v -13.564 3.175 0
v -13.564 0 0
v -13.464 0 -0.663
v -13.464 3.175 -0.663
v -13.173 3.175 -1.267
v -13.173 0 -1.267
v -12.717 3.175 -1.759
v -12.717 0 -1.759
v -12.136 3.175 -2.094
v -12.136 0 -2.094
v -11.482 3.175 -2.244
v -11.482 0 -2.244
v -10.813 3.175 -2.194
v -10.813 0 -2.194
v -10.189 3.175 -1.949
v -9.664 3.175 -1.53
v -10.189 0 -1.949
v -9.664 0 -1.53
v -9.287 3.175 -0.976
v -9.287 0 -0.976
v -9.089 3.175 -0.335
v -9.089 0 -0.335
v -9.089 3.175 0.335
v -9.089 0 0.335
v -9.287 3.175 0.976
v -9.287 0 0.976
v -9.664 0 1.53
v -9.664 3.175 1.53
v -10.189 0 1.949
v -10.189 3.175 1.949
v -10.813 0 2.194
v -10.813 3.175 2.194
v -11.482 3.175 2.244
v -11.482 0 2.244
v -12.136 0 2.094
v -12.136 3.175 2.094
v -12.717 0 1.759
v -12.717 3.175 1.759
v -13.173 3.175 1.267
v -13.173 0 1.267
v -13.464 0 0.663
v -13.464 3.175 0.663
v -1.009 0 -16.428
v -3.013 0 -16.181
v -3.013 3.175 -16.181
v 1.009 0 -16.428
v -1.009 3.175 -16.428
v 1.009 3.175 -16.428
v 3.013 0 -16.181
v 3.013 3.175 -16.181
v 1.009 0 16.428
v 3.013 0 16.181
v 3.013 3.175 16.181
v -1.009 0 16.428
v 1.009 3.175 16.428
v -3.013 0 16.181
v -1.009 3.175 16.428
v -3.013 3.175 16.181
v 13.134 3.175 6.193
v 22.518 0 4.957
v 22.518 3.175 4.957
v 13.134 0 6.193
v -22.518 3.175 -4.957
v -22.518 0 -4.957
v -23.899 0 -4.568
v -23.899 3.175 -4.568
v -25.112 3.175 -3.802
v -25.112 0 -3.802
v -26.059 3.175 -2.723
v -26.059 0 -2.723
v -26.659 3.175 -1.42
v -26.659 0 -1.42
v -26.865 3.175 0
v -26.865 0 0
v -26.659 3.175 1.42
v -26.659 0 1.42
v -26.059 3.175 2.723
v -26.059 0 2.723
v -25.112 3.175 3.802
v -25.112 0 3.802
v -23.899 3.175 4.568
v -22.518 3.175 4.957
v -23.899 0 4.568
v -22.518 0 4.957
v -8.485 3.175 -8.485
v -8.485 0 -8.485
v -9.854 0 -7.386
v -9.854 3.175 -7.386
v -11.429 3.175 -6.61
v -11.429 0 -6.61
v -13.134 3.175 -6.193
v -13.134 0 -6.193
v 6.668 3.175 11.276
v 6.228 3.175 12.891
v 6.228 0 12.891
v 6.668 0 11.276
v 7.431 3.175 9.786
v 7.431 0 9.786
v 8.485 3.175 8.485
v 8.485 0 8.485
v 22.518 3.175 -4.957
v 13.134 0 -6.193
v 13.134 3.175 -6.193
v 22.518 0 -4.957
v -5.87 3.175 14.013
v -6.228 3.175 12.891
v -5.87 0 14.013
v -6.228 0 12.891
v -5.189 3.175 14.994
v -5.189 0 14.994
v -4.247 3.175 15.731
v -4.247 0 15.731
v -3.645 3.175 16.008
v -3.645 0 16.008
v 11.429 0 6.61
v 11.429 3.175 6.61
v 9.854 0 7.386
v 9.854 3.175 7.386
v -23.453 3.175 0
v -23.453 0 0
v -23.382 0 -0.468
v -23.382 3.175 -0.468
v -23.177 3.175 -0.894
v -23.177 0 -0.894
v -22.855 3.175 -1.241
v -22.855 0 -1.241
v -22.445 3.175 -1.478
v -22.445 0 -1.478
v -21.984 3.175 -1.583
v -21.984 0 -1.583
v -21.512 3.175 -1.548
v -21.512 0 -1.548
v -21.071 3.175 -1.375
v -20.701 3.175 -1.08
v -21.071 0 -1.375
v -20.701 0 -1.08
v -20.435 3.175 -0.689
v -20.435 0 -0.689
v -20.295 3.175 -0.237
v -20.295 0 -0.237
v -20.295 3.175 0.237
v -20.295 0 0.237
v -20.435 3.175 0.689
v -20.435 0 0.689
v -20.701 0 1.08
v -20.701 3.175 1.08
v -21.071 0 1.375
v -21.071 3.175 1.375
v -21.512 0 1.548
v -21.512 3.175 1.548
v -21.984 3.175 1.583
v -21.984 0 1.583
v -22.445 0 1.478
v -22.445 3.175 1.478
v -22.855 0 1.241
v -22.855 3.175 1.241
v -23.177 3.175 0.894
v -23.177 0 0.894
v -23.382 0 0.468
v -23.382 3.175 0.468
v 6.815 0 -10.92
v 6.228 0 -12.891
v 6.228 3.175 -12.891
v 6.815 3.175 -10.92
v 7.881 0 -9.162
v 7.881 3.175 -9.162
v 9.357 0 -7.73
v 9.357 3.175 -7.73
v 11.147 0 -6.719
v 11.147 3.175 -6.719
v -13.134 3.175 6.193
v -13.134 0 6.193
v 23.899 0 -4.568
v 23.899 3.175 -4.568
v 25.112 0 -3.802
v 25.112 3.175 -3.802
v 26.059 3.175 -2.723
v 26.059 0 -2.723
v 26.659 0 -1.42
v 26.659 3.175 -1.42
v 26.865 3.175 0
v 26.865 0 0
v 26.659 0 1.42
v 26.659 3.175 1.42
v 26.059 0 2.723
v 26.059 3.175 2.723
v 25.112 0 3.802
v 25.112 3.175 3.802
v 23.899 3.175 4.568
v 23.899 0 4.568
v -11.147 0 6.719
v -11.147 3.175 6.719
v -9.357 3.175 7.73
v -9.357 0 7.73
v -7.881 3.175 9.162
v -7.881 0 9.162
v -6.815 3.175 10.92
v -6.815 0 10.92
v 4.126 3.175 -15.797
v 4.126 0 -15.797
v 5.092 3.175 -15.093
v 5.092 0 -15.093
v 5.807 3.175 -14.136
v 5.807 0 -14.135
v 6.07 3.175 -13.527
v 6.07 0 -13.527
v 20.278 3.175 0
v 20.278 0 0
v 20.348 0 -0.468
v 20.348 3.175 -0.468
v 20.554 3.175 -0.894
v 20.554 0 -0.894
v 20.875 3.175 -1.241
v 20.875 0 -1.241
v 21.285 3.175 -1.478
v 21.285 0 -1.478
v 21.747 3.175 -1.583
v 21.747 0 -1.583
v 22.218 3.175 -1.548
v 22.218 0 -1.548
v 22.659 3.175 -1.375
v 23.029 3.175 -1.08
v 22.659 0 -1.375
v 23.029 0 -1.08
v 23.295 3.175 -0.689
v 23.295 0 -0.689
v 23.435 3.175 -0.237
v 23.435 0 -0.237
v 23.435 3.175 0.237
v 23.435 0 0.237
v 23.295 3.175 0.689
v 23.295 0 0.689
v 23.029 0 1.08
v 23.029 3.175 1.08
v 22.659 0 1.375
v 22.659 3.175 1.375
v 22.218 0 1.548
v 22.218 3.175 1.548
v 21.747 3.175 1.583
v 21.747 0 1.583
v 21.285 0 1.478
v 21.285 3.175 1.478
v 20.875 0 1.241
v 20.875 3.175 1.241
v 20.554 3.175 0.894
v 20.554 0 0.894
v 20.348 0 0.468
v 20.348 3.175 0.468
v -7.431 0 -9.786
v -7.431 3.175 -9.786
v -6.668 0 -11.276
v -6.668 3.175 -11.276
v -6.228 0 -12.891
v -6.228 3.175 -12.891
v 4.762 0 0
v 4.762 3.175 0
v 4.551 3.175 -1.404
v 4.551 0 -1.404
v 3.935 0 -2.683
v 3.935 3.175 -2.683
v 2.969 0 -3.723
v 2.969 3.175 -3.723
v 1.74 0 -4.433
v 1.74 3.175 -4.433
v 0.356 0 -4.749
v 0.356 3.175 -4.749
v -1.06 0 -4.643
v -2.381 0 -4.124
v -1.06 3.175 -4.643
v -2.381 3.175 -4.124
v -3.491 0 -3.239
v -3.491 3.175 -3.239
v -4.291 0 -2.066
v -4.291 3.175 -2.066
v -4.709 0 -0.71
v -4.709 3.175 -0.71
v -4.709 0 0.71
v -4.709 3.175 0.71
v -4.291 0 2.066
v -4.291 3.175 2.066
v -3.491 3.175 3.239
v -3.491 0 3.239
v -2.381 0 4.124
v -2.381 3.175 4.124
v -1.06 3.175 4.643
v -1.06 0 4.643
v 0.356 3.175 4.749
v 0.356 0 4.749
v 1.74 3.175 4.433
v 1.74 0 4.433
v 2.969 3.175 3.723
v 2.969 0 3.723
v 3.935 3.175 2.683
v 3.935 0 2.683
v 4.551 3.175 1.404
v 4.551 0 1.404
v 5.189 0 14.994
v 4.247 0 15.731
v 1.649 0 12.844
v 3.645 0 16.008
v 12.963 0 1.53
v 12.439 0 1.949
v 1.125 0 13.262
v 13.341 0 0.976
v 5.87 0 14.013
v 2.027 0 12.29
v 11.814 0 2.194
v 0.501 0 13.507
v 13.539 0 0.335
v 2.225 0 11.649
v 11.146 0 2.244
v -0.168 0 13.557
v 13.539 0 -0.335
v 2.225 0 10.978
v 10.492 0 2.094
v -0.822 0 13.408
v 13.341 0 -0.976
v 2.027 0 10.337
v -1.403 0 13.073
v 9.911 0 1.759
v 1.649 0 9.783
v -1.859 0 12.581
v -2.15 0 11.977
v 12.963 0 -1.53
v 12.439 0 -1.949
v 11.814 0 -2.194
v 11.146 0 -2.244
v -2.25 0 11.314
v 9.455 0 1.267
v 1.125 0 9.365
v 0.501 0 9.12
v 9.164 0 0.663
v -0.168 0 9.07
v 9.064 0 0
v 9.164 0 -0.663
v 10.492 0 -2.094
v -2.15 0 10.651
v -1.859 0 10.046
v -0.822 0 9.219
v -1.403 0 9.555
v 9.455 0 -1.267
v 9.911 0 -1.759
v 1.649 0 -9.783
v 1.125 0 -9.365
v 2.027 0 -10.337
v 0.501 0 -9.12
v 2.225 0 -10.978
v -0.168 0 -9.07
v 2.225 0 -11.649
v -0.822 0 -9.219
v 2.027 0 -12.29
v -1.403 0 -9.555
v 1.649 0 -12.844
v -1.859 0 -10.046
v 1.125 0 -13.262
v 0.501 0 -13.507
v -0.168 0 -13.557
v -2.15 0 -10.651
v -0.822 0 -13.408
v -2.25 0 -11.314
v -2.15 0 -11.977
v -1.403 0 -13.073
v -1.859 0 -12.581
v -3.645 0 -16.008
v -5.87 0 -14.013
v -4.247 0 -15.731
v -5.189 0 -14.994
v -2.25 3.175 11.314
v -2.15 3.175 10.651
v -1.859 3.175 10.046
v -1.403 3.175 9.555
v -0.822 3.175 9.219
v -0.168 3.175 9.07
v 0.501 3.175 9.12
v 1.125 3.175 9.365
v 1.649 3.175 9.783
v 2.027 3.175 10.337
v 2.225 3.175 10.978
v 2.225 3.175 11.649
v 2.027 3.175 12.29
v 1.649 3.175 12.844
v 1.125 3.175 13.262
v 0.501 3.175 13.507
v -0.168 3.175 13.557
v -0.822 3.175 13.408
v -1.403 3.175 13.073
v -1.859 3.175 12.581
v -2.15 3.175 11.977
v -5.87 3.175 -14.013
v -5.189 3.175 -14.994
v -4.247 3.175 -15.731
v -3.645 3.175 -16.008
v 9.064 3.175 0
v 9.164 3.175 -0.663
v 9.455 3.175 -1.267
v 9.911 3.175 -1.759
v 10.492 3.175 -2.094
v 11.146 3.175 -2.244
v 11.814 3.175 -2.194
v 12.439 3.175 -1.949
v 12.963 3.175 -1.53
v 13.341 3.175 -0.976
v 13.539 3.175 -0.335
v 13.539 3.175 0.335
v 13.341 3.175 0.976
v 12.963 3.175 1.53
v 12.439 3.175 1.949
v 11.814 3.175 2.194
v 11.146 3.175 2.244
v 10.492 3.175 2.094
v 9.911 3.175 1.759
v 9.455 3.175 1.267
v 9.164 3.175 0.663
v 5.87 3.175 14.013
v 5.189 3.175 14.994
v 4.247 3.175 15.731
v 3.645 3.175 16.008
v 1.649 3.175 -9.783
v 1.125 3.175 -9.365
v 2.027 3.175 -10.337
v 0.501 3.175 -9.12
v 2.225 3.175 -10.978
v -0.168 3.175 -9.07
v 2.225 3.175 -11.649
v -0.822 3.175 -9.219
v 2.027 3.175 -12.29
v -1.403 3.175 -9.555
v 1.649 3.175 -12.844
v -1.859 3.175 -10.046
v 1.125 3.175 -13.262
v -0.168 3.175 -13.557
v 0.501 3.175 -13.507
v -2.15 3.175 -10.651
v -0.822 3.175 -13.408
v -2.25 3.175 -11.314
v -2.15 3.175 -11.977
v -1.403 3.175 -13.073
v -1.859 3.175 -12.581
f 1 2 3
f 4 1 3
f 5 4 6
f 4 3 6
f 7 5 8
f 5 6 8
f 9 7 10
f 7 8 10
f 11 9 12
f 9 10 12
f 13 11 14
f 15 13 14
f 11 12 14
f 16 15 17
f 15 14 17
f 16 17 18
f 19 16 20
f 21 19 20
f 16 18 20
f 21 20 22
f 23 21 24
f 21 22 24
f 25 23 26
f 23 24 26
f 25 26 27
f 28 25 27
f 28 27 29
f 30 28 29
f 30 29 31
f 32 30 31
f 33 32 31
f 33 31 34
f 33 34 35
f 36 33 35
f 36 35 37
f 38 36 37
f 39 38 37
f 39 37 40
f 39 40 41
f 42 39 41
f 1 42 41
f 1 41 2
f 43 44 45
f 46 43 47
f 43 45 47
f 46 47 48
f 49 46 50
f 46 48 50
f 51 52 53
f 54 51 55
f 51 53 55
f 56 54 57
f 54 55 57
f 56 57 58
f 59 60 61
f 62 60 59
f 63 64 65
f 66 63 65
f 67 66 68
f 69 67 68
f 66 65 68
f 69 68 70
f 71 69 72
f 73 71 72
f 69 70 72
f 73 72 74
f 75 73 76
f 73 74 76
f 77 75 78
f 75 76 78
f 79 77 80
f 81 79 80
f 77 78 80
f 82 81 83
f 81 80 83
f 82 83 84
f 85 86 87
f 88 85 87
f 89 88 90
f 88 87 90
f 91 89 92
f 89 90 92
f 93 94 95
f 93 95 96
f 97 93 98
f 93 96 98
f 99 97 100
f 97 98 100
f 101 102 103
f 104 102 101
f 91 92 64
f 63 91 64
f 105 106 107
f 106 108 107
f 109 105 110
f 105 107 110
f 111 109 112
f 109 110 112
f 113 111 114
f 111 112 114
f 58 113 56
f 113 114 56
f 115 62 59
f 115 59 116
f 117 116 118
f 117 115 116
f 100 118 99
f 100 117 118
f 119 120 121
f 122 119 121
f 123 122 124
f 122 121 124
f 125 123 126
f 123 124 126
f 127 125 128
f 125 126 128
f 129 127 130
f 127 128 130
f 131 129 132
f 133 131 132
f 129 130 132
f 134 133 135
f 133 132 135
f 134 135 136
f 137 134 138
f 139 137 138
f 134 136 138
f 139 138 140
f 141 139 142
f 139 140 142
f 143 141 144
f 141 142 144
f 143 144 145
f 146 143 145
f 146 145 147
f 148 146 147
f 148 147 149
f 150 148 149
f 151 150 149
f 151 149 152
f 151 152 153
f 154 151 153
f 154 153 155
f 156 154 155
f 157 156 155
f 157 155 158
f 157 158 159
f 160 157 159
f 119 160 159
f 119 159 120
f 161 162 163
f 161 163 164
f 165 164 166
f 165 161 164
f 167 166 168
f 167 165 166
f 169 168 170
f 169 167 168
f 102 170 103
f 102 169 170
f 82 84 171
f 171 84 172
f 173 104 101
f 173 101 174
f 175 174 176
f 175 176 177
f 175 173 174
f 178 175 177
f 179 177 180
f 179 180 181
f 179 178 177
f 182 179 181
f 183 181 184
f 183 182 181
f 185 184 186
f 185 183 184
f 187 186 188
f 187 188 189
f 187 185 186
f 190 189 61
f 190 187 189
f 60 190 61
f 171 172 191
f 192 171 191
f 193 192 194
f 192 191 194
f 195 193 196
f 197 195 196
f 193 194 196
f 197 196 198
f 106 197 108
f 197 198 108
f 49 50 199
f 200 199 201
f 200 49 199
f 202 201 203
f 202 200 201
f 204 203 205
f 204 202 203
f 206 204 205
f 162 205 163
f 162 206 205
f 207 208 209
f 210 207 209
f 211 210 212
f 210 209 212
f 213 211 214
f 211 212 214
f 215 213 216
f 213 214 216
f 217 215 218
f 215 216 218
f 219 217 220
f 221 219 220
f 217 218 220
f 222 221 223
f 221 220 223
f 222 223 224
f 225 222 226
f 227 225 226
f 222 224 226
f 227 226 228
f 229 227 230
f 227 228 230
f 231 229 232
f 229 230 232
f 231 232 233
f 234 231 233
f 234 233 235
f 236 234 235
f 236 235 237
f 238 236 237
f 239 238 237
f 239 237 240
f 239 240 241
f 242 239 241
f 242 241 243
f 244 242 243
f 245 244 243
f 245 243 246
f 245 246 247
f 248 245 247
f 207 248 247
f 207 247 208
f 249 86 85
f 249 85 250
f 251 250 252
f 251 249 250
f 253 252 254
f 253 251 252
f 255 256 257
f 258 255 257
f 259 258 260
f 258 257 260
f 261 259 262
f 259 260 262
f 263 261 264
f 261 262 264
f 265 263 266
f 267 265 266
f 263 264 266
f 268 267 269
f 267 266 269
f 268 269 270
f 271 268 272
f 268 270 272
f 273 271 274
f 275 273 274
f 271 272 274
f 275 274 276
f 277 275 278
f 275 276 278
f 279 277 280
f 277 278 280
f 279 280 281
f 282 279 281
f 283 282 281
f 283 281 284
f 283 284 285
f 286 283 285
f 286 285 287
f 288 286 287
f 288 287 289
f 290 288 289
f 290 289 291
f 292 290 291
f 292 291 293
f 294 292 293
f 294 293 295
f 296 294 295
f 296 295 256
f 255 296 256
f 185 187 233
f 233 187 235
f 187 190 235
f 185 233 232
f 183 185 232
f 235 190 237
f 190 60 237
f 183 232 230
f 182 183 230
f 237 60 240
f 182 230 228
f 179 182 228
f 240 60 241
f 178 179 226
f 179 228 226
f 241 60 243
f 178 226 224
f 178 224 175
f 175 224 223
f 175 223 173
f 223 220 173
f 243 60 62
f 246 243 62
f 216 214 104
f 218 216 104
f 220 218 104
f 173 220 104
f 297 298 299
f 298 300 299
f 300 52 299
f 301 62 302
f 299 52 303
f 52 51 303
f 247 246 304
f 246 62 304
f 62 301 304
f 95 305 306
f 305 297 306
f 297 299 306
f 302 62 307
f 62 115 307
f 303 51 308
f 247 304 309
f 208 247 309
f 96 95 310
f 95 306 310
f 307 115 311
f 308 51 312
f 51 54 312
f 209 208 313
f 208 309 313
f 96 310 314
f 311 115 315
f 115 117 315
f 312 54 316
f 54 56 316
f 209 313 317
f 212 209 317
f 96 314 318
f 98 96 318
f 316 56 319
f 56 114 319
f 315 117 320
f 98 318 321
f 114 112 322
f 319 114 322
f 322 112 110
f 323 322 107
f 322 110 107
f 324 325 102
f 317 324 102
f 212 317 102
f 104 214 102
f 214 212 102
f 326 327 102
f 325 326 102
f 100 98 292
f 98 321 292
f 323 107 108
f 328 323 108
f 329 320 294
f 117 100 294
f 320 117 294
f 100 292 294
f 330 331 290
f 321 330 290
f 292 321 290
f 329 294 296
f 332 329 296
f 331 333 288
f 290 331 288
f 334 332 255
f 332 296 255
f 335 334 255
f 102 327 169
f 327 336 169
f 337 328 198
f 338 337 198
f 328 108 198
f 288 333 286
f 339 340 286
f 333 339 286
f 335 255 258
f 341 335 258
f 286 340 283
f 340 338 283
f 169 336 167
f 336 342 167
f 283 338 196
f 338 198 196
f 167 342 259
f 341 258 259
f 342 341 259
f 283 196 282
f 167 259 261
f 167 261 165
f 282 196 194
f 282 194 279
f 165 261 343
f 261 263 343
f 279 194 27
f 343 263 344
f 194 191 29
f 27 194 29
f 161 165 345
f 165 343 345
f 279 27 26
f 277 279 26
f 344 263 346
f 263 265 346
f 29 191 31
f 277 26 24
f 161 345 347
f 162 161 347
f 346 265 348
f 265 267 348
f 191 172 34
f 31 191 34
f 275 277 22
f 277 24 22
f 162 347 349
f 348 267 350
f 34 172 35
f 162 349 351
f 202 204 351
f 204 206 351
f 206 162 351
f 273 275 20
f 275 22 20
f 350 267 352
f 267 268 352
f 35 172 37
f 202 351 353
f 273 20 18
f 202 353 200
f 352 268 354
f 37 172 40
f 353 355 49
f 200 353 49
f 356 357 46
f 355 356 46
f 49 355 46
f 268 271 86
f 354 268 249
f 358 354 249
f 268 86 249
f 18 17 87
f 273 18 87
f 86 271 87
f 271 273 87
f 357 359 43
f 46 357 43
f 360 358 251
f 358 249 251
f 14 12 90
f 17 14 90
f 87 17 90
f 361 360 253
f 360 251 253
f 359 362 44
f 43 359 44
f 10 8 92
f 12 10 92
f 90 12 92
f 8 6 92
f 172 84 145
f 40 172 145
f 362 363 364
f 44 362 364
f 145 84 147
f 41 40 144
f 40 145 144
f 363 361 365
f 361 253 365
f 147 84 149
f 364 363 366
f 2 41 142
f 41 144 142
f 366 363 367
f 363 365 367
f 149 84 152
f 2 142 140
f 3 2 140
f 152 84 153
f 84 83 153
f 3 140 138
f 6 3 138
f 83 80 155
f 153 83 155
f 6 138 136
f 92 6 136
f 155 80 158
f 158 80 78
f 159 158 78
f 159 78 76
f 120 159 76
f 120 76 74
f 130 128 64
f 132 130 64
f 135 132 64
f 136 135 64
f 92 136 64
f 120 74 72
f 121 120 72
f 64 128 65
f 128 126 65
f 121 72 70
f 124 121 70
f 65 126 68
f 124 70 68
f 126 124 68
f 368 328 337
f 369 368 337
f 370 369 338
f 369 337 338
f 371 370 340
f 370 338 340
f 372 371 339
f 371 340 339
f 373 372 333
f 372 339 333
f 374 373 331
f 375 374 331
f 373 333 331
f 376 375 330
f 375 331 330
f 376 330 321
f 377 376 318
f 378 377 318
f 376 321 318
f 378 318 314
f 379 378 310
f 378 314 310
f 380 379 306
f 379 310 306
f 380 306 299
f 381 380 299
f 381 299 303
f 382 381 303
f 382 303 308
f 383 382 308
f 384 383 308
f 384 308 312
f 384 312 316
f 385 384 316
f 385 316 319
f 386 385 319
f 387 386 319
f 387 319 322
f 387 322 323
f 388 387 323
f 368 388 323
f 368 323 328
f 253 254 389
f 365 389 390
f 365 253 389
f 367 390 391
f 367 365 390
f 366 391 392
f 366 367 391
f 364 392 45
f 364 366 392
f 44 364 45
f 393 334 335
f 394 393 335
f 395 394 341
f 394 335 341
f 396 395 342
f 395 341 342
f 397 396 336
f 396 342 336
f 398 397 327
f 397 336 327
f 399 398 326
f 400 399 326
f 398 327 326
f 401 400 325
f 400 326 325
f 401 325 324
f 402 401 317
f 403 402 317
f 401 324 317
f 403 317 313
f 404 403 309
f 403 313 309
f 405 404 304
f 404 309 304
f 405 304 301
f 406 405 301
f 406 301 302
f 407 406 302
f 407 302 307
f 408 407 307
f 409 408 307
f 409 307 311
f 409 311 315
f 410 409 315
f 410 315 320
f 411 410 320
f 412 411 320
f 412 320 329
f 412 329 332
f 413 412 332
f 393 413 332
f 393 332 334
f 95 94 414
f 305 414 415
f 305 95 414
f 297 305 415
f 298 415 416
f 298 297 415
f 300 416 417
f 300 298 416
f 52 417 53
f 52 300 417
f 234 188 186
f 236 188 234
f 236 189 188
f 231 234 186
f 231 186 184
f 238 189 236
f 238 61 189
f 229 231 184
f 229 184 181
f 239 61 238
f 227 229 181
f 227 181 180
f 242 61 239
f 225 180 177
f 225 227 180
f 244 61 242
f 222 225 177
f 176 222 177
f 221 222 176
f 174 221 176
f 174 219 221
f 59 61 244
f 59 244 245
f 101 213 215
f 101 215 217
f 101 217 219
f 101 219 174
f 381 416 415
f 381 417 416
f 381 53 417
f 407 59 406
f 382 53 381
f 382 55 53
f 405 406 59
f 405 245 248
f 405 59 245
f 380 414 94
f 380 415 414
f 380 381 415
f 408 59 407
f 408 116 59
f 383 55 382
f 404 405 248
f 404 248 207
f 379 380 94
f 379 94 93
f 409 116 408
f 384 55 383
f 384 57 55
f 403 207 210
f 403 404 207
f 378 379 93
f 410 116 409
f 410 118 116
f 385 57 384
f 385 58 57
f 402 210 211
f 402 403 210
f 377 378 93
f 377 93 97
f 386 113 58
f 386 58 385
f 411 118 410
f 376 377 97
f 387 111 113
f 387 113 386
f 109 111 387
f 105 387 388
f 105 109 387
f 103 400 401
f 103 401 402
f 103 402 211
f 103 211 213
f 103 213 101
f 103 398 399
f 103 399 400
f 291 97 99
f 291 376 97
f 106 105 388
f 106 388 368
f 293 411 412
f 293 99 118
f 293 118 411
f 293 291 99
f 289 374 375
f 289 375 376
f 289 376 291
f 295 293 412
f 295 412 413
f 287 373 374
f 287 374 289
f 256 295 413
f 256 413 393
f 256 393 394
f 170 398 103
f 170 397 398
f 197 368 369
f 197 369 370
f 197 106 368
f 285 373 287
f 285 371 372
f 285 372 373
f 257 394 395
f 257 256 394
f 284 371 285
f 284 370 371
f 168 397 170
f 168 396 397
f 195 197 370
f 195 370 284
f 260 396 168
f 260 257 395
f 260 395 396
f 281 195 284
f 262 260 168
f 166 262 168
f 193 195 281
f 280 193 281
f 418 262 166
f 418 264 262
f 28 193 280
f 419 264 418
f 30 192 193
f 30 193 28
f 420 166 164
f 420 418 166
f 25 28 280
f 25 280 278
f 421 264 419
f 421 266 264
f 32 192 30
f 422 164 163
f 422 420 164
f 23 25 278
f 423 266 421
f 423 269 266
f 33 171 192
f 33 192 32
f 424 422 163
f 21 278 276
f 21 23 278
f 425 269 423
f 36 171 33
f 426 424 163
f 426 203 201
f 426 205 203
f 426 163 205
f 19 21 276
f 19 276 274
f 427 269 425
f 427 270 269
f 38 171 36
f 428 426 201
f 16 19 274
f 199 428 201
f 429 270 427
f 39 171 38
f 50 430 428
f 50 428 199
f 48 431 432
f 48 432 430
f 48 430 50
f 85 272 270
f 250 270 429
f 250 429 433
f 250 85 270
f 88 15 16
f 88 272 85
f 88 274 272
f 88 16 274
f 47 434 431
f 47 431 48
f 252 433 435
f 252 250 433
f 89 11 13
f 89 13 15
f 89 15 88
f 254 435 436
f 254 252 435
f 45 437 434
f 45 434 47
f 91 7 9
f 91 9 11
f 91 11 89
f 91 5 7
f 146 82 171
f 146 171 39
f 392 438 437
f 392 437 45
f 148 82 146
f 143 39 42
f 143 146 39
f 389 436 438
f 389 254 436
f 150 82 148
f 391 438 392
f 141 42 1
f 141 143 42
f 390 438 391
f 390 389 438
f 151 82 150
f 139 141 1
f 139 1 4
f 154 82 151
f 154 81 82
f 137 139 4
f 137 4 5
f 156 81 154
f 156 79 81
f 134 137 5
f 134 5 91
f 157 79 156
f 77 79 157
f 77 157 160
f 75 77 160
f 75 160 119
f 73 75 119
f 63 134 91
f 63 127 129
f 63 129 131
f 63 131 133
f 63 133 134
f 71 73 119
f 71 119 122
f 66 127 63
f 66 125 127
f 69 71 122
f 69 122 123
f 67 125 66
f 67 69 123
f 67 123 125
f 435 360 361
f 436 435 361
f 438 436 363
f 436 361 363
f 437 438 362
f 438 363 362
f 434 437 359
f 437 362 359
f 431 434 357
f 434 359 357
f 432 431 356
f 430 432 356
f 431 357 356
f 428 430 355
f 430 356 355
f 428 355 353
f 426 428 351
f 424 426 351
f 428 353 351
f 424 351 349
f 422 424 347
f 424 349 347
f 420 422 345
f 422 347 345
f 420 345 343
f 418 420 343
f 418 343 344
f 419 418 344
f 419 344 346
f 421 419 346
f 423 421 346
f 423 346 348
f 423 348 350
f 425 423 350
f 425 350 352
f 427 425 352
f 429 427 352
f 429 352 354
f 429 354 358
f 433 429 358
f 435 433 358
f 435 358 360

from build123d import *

# Parameters (mm, degrees)
BOSS_EXTRUDE1_DEPTH        = 3.175
F_1_8_0_1250_DOWEL_HOLE1_D = 3.175
SKETCH4_R                  = 4.7625
CUT_EXTRUDE1_DEPTH         = 4.175
M4_CLEARANCE_HOLE1_D       = 4.5
SKETCH7_R                  = 1.5875
CUT_EXTRUDE2_DEPTH         = 4.175
FILLET1_R                  = 4


with BuildPart() as part:
    # Sketch1 → Boss-Extrude1 (new body)
    with BuildSketch(Plane(origin=(0, 0, 0), x_dir=(1, 0, 0), z_dir=(0, 1, 0))):
        with BuildLine():
            Line((4.957224307, 22.517830961), (6.192571563, 13.134436958))
            ThreePointArc((6.192571563, 13.134436958), (8.485281374, 8.485281374), (13.134436958, 6.192571563))
            Line((13.134436958, 6.192571563), (22.517830961, 4.957224307))
            ThreePointArc((22.517830961, 4.957224307), (26.8652, 0), (22.517830961, -4.957224307))
            Line((22.517830961, -4.957224307), (13.134436958, -6.192571563))
            ThreePointArc((13.134436958, -6.192571563), (10.620595205, -6.955137122), (8.485281374, -8.485281374))
            Line((8.485281374, -8.485281374), (-8.485281374, 8.485281374))
            ThreePointArc((-8.485281374, 8.485281374), (-6.955137122, 10.620595205), (-6.192571563, 13.134436958))
            Line((-6.192571563, 13.134436958), (-4.957224307, 22.517830961))
            ThreePointArc((-4.957224307, 22.517830961), (0, 26.8652), (4.957224307, 22.517830961))
        make_face()
    boss_extrude1 = extrude(amount=BOSS_EXTRUDE1_DEPTH)

    # Mirror7: Boss-Extrude1 across plane
    add(boss_extrude1.mirror(Plane(origin=(-8.485281374, 3.175, -8.485281374), x_dir=(0.707106781, 0, 0.707106781), z_dir=(0.707106781, 0, -0.707106781))))

    # 1/8 (0.1250) Dowel Hole1 (through all)
    with Locations(Plane(origin=(0, 3.175, 0), x_dir=(1, 0, 0), z_dir=(0, 1, 0))):
        with Locations((0, 21.8652), (0, -21.8652), (-21.8652, 0), (21.8652, 0)):
            Hole(F_1_8_0_1250_DOWEL_HOLE1_D / 2)

    # Sketch4 → Cut-Extrude1 (cut, through all)
    with BuildSketch(Plane(origin=(0, 3.175, 0), x_dir=(1, 0, 0), z_dir=(0, 1, 0))):
        Circle(SKETCH4_R)
    extrude(amount=-CUT_EXTRUDE1_DEPTH, mode=Mode.SUBTRACT)

    # M4 Clearance Hole1 (through all)
    with Locations(Plane(origin=(0, 3.175, 0), x_dir=(1, 0, 0), z_dir=(0, 1, 0))):
        with Locations((-11.313708499, 0), (0, 11.313708499), (11.313708499, 0), (0, -11.313708499)):
            Hole(M4_CLEARANCE_HOLE1_D / 2)

    # Sketch7 → Cut-Extrude2 (cut, through all)
    with BuildSketch(Plane(origin=(0, 3.175, 0), x_dir=(1, 0, 0), z_dir=(0, 1, 0))):
        with BuildLine():
            ThreePointArc((4.957224307, 22.517830961), (0, 26.8652), (-4.957224307, 22.517830961))
            Line((-4.957224307, 22.517830961), (-5.898887631, 15.365187896))
            ThreePointArc((-5.898887631, 15.365187896), (0, 16.458610949), (5.898887631, 15.365187896))
            Line((5.898887631, 15.365187896), (4.957224307, 22.517830961))
        make_face()
        with Locations((0, 21.8652)):
            Circle(SKETCH7_R, mode=Mode.SUBTRACT)
        with BuildLine():
            ThreePointArc((5.898887631, -15.365187896), (0, -16.458610949), (-5.898887631, -15.365187896))
            Line((-5.898887631, -15.365187896), (-4.957224307, -22.517830961))
            ThreePointArc((-4.957224307, -22.517830961), (0, -26.8652), (4.957224307, -22.517830961))
            Line((4.957224307, -22.517830961), (5.898887631, -15.365187896))
        make_face()
        with Locations((0, -21.8652)):
            Circle(SKETCH7_R, mode=Mode.SUBTRACT)
    extrude(amount=-CUT_EXTRUDE2_DEPTH, mode=Mode.SUBTRACT)

    # Fillet1
    fillet1_edges = [part.edges().sort_by_distance(p)[0] for p in [
        (5.898887631, 1.5875, -15.365187896),
        (-5.898887631, 1.5875, -15.365187896),
        (-5.898887631, 1.5875, 15.365187896),
        (5.898887631, 1.5875, 15.365187896),
    ]]
    fillet(fillet1_edges, radius=FILLET1_R)


solid = part.part
